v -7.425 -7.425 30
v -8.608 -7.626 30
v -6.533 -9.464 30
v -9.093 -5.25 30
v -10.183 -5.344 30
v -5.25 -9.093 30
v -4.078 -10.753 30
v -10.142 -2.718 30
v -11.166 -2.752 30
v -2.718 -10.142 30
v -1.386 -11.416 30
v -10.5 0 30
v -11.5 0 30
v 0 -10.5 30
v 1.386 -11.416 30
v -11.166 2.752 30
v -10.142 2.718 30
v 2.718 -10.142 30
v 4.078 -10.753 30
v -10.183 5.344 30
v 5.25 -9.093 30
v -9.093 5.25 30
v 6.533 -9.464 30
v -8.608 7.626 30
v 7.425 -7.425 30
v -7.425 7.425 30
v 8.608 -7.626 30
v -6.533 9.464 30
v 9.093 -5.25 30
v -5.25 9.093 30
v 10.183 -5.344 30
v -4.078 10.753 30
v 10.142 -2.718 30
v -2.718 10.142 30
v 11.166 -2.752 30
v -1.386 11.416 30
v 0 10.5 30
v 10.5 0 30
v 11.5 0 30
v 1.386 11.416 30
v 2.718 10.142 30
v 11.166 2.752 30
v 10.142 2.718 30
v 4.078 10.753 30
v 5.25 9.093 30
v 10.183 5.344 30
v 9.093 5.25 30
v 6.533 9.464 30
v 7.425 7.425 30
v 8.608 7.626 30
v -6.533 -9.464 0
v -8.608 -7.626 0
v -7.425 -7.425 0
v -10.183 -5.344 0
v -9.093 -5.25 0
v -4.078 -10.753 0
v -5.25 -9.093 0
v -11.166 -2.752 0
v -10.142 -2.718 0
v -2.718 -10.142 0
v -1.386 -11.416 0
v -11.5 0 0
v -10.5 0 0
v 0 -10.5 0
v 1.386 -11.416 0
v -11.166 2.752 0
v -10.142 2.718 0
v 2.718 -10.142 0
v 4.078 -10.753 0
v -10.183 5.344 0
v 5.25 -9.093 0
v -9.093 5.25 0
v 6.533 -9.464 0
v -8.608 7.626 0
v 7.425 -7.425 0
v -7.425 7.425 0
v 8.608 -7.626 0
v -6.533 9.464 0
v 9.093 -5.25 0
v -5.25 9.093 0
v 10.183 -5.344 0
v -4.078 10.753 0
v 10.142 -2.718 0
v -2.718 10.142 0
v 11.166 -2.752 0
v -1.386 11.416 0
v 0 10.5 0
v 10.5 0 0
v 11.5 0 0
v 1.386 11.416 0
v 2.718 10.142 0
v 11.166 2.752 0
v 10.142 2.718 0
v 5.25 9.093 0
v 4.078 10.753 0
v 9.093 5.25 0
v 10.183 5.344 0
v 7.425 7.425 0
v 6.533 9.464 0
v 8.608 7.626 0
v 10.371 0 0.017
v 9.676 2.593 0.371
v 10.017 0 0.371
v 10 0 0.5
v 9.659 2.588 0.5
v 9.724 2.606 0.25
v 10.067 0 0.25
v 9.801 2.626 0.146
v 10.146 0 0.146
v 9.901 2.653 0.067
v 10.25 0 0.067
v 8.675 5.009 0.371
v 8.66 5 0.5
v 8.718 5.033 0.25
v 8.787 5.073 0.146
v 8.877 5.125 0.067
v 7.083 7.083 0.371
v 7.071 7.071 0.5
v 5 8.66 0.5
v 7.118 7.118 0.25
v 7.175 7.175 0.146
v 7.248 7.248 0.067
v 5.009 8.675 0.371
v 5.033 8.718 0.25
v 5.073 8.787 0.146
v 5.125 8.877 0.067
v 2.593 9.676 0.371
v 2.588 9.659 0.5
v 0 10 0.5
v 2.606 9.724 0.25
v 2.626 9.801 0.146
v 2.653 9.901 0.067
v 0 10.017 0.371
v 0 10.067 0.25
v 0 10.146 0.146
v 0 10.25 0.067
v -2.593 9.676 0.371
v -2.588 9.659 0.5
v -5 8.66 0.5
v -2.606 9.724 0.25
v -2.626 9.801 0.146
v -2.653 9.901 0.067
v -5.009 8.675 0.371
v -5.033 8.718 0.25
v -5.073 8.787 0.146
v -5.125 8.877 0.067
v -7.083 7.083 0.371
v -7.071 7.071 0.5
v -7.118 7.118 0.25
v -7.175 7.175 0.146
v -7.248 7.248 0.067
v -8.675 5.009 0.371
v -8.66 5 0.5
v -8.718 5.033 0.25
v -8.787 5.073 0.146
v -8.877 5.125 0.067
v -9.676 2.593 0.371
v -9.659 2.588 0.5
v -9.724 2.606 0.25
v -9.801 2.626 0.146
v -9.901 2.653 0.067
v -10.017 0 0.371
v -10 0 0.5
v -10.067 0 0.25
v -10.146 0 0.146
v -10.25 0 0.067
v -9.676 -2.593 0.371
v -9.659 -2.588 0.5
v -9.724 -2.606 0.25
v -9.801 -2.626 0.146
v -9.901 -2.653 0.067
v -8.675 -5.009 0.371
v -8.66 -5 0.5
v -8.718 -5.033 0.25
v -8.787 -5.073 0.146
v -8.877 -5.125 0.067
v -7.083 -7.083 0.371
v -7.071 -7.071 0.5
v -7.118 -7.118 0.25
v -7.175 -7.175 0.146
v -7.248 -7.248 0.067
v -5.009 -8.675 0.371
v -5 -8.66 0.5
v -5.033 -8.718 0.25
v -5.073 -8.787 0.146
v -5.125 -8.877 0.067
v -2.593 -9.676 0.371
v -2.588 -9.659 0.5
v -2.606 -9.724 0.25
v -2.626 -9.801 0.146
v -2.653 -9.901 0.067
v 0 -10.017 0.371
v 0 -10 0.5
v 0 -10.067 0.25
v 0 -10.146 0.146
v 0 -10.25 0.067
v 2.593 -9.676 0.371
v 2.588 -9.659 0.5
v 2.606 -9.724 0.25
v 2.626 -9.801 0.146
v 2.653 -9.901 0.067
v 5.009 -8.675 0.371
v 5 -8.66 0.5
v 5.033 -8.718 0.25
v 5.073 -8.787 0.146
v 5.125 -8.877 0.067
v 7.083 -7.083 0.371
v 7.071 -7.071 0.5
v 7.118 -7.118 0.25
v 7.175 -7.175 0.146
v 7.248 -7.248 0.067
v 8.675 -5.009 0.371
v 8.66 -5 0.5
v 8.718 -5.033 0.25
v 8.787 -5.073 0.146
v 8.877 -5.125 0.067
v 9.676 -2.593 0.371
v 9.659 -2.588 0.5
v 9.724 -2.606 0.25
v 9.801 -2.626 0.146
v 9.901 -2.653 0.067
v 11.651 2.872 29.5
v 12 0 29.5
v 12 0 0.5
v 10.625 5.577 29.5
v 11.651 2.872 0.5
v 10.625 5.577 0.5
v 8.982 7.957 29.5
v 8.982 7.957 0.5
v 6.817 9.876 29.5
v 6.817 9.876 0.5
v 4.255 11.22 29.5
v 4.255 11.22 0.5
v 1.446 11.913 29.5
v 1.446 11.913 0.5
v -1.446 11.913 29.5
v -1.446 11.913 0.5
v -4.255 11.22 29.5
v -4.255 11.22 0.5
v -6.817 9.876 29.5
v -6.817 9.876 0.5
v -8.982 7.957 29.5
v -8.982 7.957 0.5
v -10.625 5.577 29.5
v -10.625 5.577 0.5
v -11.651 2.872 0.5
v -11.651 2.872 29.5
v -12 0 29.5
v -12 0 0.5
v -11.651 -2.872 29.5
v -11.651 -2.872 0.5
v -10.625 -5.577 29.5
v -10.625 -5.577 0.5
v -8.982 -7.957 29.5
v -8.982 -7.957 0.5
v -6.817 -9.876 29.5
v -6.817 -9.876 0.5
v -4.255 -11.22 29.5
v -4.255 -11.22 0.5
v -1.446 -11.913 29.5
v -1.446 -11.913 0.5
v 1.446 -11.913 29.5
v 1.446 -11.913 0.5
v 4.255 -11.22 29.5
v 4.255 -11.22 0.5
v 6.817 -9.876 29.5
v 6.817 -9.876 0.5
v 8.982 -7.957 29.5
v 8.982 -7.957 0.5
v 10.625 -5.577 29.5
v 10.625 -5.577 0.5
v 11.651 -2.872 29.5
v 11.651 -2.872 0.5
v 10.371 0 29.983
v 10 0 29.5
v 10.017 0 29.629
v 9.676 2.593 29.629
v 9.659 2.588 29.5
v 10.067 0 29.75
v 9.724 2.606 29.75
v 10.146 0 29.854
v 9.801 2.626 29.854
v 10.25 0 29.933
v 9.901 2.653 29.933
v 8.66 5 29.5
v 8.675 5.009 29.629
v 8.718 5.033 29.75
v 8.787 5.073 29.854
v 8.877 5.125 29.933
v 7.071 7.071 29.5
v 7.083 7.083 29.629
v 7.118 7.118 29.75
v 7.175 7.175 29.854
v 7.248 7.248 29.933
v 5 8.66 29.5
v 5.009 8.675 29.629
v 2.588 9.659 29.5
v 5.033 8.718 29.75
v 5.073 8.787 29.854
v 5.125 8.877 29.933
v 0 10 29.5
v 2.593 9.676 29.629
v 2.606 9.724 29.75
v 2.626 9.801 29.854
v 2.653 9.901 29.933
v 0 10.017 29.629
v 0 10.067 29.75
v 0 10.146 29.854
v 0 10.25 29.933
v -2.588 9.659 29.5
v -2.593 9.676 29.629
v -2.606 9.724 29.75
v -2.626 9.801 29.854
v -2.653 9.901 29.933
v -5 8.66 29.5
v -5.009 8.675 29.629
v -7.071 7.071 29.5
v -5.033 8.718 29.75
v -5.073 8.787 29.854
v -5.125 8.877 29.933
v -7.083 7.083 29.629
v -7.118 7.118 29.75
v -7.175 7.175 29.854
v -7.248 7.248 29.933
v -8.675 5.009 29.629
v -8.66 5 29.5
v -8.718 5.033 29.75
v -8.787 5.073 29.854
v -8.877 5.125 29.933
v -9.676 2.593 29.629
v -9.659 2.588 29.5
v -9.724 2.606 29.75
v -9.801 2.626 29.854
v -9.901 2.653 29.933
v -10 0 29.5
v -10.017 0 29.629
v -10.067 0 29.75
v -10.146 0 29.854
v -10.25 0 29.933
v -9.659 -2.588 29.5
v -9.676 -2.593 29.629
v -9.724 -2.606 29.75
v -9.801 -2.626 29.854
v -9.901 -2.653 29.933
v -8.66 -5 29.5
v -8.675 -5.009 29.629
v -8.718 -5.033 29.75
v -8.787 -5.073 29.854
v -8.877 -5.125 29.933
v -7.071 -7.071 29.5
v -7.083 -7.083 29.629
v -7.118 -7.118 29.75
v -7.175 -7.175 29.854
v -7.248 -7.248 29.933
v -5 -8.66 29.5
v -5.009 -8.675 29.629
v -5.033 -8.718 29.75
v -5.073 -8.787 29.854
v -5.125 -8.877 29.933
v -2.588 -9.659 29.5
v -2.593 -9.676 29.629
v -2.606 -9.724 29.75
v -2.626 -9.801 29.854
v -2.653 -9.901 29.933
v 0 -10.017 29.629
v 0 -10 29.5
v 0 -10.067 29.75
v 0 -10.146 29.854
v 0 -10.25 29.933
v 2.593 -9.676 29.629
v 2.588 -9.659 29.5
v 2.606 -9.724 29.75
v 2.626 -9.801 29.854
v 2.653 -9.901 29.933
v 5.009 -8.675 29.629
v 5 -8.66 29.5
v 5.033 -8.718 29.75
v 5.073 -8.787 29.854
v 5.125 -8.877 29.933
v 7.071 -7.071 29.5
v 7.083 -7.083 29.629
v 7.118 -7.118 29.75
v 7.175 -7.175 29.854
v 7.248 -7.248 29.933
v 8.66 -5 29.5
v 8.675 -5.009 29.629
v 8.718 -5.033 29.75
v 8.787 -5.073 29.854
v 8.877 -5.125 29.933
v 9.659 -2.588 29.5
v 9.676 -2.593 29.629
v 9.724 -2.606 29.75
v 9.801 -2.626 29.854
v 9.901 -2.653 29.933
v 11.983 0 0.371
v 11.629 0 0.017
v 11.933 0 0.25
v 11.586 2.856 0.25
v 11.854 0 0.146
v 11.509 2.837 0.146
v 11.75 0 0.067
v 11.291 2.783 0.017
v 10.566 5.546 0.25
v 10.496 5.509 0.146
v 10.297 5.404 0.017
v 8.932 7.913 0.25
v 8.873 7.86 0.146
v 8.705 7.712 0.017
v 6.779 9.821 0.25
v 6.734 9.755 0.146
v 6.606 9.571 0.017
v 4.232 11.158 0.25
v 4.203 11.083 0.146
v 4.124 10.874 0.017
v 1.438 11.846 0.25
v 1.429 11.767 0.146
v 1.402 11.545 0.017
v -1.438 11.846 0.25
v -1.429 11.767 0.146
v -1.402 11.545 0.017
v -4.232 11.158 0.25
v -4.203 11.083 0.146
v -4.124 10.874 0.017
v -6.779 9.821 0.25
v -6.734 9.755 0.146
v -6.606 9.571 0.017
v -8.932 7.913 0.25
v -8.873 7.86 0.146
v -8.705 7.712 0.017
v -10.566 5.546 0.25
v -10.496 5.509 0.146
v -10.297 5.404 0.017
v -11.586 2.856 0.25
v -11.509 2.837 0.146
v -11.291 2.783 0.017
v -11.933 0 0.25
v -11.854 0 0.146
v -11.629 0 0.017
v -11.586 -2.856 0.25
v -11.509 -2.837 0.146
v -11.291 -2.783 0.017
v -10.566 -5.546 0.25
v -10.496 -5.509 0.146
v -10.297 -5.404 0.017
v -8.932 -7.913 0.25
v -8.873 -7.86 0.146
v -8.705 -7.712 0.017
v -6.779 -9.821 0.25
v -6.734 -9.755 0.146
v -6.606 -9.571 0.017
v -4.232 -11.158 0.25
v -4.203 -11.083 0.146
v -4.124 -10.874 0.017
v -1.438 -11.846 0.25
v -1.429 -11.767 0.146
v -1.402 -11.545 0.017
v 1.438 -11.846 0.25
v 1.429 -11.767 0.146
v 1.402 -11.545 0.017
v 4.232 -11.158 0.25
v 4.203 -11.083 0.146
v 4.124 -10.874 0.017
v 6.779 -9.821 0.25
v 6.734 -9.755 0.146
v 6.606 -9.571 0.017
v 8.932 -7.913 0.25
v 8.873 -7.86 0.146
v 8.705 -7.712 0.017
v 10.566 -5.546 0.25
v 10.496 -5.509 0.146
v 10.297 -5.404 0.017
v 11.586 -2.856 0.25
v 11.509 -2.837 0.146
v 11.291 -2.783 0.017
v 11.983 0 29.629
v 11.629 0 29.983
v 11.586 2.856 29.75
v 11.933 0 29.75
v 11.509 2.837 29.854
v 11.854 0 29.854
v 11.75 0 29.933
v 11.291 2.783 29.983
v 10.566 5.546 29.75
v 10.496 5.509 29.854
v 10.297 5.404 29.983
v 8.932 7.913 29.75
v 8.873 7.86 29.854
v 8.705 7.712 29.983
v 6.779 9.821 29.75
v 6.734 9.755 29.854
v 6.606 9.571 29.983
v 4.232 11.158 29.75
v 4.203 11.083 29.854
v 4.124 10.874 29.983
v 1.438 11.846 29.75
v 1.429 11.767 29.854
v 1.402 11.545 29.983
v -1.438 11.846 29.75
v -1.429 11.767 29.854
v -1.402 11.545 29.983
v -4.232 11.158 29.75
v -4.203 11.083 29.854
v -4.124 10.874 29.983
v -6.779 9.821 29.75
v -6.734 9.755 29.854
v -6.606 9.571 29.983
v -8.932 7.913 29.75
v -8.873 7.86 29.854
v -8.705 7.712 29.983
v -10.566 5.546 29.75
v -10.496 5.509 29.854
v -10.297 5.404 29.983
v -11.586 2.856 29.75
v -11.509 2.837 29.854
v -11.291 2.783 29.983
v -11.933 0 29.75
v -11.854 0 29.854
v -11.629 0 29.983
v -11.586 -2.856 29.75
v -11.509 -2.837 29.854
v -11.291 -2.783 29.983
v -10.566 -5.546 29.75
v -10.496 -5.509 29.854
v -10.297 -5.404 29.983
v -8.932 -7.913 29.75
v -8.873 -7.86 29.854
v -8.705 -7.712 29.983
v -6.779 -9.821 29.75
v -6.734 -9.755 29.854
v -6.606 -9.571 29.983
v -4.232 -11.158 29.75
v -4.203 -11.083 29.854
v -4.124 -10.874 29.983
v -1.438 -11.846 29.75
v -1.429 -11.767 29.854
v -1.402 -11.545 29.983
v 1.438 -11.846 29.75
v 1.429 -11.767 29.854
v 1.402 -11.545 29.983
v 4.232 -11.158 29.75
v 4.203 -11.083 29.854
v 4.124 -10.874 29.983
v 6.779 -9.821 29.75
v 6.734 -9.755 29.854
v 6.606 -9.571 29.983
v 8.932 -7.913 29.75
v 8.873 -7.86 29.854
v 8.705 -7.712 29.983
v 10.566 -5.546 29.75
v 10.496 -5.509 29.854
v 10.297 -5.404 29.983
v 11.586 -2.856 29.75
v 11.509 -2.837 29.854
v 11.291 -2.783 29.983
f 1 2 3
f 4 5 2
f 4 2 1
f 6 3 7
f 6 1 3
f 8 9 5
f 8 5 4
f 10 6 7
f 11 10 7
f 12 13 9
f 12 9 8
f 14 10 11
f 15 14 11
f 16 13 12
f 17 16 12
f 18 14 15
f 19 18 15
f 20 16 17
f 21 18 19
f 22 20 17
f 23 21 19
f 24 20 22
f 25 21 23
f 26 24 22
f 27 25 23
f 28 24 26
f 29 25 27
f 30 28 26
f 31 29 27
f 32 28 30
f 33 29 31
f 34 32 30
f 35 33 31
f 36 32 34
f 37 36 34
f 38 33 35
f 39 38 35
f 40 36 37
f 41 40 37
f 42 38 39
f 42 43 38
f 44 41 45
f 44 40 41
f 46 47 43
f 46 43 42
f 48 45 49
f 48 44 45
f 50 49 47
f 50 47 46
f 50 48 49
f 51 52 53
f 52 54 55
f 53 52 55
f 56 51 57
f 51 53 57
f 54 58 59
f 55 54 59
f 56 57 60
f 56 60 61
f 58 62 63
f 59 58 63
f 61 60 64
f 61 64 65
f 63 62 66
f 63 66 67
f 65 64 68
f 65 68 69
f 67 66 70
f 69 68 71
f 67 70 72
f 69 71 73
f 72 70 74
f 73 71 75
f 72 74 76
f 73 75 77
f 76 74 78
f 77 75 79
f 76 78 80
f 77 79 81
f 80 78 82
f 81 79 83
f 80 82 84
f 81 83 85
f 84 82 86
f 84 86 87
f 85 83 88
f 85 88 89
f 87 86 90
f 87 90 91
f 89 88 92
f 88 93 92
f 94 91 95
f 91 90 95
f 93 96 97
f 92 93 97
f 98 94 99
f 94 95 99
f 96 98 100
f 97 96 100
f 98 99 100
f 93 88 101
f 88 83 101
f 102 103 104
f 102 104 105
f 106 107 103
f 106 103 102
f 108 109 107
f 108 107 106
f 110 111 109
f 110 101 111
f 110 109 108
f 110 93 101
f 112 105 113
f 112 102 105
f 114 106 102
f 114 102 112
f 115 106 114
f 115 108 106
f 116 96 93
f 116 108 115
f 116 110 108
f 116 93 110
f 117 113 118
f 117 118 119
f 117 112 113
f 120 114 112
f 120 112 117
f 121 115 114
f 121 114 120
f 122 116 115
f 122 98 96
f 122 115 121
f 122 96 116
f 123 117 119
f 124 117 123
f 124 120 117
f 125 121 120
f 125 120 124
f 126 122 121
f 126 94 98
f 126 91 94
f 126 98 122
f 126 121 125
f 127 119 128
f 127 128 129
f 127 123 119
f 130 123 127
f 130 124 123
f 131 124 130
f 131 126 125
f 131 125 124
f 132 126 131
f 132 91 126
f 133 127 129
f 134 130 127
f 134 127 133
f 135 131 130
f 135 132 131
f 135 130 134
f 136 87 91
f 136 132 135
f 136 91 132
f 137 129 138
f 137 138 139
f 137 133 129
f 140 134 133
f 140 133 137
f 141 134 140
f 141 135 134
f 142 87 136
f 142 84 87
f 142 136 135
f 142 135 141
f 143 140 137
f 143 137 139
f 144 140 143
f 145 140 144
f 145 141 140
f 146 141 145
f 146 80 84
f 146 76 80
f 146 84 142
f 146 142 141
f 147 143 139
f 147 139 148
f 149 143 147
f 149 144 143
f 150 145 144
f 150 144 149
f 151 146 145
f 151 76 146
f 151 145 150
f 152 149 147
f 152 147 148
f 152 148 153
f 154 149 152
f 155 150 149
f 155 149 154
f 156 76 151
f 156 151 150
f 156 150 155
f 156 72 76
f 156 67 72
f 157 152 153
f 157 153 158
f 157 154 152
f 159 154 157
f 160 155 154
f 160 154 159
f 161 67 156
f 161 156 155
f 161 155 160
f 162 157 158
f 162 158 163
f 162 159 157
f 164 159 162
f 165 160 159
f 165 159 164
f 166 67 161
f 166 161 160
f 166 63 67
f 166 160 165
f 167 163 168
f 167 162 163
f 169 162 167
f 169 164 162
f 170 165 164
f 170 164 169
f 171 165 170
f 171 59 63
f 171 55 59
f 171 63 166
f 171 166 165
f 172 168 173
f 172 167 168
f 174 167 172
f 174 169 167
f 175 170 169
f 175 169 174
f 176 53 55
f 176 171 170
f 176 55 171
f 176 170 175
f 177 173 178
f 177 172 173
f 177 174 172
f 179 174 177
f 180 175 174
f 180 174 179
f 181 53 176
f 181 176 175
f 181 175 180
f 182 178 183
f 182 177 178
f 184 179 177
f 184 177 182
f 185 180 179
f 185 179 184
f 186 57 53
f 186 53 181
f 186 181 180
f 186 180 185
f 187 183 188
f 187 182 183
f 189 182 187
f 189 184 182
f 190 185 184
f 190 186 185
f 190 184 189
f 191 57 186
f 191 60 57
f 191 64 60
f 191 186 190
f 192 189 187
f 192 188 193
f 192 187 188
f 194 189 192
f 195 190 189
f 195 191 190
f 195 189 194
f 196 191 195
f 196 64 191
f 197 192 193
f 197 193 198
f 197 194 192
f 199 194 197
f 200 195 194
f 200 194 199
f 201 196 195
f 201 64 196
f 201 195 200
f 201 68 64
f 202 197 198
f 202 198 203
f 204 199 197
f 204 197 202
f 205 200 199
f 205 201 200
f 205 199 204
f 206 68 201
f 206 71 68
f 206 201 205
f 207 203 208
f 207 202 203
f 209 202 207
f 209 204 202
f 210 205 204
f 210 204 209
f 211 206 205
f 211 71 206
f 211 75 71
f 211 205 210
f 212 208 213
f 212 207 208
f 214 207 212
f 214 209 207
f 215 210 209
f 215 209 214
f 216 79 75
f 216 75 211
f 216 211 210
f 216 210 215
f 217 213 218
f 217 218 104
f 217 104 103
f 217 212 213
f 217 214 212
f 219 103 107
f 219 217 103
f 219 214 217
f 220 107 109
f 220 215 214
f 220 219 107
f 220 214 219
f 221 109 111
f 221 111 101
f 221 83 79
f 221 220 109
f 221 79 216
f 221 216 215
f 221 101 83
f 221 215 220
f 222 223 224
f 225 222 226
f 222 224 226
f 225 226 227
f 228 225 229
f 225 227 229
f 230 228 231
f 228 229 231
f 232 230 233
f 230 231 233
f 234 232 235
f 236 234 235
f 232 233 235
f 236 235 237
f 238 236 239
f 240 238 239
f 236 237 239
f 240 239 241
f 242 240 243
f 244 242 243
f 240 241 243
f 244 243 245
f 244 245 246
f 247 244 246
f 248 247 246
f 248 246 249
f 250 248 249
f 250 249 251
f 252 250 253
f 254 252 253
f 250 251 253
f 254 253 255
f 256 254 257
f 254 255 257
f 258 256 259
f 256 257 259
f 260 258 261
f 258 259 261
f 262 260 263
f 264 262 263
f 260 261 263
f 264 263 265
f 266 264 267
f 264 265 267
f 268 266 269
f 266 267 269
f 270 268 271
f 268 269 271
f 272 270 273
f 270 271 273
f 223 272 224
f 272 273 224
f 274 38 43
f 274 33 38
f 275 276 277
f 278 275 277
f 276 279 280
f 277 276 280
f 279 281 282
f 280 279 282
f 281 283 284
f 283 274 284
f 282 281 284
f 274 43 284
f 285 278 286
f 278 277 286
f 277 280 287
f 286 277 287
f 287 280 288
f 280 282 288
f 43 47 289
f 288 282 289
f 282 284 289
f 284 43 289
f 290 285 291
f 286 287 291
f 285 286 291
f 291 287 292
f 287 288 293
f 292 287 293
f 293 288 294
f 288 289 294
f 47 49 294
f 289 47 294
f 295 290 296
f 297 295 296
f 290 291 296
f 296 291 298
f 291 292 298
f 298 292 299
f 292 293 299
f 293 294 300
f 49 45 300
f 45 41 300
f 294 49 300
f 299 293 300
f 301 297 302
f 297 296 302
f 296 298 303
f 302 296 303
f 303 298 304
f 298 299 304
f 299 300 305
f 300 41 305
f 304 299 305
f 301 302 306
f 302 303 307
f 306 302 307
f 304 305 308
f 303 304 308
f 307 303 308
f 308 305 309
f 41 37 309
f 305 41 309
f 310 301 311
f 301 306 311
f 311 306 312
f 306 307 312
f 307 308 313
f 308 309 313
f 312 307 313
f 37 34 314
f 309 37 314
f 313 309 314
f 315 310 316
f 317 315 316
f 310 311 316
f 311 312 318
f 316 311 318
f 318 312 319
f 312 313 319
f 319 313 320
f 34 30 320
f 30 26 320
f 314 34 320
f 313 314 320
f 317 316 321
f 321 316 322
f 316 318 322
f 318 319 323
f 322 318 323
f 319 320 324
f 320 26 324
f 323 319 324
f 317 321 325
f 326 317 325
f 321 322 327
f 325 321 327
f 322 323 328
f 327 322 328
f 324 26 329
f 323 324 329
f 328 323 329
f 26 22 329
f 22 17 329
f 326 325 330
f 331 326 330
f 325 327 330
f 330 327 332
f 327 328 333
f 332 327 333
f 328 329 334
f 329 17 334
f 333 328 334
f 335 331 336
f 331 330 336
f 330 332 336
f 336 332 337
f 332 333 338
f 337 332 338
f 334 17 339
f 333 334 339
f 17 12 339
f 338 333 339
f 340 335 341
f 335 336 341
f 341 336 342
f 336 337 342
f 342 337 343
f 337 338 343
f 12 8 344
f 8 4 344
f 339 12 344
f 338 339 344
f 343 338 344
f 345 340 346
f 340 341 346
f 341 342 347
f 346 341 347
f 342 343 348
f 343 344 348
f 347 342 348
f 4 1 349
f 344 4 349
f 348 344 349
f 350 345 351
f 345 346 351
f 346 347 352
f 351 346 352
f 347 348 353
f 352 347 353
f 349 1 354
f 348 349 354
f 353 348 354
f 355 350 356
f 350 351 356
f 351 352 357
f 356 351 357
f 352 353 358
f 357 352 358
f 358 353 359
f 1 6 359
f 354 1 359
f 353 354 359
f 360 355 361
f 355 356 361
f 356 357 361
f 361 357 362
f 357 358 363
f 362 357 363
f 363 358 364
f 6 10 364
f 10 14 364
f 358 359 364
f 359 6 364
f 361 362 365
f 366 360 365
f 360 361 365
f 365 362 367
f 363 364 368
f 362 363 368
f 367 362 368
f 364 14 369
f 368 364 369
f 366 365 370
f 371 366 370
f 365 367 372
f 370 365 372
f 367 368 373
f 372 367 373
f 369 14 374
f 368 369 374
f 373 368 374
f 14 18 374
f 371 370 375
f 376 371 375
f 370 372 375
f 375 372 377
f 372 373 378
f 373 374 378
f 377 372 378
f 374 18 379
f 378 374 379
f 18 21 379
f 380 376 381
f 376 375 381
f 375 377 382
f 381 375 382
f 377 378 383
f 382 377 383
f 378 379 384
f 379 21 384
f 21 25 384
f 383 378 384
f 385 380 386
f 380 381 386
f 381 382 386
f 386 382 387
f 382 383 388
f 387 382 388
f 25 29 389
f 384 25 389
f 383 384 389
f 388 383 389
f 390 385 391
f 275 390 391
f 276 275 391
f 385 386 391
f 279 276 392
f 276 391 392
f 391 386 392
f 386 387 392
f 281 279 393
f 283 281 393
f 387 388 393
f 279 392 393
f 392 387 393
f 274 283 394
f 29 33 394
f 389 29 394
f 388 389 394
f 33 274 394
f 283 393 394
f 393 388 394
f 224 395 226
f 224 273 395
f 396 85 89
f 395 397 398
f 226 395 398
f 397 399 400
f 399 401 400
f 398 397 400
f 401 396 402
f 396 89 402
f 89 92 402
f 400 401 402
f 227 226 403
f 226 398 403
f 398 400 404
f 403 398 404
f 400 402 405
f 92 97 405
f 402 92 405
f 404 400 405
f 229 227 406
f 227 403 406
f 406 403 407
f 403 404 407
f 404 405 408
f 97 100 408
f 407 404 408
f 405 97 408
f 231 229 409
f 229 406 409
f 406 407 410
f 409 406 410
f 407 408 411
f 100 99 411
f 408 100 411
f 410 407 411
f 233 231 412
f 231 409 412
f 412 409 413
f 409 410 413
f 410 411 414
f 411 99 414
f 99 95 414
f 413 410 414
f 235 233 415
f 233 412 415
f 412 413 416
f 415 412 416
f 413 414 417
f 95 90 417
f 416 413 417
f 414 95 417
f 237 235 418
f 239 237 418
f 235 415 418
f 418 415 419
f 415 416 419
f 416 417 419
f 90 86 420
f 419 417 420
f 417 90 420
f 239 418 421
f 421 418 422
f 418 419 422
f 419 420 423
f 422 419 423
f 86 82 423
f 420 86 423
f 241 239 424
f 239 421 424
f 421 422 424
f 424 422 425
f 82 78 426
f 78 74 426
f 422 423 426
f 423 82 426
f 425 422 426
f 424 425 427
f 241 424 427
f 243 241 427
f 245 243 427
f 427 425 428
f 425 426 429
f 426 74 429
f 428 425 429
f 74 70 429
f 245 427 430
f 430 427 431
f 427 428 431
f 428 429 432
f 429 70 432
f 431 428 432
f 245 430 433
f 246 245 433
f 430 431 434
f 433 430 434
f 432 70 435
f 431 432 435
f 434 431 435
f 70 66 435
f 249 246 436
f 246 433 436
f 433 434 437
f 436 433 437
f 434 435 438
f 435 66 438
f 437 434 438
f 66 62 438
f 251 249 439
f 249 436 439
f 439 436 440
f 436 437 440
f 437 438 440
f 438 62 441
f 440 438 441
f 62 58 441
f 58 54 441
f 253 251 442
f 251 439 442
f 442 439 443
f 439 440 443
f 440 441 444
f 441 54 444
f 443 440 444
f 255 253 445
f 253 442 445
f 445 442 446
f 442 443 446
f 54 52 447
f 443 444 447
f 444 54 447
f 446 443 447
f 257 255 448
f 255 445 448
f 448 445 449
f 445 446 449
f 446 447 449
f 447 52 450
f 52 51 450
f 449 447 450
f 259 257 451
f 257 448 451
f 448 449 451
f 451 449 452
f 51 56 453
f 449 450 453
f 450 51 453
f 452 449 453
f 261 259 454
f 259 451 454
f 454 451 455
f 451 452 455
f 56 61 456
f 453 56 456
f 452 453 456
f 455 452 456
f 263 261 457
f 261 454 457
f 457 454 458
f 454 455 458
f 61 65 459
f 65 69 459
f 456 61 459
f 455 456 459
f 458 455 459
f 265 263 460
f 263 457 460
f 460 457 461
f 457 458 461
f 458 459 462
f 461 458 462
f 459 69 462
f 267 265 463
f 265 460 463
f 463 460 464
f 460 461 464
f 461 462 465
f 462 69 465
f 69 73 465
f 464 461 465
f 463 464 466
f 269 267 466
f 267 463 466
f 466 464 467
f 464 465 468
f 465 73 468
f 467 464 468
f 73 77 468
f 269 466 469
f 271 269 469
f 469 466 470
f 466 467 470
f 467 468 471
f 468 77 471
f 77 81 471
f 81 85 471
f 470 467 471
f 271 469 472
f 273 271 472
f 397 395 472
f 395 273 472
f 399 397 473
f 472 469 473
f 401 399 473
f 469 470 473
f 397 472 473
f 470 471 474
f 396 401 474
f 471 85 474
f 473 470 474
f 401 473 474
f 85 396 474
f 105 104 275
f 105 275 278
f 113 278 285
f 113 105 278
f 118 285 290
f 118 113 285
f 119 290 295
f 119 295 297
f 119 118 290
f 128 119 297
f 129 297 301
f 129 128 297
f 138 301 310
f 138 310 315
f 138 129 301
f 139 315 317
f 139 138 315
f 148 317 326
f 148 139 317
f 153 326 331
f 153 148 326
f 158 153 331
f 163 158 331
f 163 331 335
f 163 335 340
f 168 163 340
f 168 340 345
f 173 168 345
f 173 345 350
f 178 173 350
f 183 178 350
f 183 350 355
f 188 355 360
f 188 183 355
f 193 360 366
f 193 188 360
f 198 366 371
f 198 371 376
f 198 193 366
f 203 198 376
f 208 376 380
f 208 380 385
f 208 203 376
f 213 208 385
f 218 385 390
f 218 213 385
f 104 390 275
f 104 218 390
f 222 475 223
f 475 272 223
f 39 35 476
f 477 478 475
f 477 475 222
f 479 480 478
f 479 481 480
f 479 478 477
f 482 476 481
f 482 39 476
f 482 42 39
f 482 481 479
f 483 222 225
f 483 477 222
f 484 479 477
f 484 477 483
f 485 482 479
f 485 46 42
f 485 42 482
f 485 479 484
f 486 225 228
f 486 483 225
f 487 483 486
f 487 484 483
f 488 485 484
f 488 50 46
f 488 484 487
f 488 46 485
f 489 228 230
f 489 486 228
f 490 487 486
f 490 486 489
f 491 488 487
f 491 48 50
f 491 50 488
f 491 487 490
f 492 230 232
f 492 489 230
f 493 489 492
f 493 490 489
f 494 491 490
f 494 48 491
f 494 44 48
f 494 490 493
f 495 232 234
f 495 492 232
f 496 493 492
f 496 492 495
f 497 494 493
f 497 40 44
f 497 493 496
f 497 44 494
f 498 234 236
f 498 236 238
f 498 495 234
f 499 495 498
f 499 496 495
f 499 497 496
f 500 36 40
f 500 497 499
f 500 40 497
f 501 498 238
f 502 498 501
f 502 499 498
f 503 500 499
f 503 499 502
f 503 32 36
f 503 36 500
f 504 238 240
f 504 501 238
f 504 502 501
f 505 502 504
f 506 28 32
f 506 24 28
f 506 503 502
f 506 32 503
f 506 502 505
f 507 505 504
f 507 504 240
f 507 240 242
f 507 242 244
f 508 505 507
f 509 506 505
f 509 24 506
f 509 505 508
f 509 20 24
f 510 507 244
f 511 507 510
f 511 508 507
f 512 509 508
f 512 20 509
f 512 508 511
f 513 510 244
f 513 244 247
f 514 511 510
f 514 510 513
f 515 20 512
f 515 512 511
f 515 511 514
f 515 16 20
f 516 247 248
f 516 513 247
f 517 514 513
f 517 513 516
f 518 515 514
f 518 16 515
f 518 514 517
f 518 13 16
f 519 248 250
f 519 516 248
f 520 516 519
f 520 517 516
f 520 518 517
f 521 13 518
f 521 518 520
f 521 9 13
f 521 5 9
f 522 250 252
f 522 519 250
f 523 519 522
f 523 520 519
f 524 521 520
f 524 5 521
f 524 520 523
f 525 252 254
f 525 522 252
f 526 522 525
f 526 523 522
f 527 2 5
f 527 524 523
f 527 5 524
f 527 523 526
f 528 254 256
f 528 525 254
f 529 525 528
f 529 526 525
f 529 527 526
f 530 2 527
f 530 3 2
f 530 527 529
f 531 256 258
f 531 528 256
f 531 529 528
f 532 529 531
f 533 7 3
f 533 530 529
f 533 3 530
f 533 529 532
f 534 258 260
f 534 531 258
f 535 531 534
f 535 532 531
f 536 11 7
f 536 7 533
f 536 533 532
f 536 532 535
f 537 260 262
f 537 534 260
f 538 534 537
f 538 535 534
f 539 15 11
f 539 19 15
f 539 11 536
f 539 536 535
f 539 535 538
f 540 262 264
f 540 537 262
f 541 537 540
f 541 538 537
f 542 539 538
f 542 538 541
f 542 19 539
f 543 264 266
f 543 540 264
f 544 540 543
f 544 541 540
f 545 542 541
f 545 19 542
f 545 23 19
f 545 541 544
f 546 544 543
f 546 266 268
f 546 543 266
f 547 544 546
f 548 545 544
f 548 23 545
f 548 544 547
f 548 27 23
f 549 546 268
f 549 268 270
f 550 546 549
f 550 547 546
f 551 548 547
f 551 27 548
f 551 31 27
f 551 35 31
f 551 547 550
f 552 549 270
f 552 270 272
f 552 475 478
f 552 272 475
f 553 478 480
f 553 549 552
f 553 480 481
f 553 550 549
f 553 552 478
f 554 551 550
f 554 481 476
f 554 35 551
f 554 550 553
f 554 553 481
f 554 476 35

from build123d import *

# Parameters (mm, degrees)
ESQUISSE1_R          = 12
ESQUISSE1_R_2        = 10
BASE_EXTRUSION_DEPTH = 30
CONG_1_R             = 0.5


with BuildPart() as part:
    # Esquisse1 → Base-Extrusion (new body)
    with BuildSketch(Plane.XY):
        Circle(ESQUISSE1_R)
        Circle(ESQUISSE1_R_2, mode=Mode.SUBTRACT)
    extrude(amount=BASE_EXTRUSION_DEPTH)

    # Congé1
    cong_1_edges = [part.edges().sort_by_distance(p)[0] for p in [
        (-12, 0, 0),
        (-12, 0, 30),
        (-10, 0, 0),
        (-10, 0, 30),
    ]]
    fillet(cong_1_edges, radius=CONG_1_R)


solid = part.part
